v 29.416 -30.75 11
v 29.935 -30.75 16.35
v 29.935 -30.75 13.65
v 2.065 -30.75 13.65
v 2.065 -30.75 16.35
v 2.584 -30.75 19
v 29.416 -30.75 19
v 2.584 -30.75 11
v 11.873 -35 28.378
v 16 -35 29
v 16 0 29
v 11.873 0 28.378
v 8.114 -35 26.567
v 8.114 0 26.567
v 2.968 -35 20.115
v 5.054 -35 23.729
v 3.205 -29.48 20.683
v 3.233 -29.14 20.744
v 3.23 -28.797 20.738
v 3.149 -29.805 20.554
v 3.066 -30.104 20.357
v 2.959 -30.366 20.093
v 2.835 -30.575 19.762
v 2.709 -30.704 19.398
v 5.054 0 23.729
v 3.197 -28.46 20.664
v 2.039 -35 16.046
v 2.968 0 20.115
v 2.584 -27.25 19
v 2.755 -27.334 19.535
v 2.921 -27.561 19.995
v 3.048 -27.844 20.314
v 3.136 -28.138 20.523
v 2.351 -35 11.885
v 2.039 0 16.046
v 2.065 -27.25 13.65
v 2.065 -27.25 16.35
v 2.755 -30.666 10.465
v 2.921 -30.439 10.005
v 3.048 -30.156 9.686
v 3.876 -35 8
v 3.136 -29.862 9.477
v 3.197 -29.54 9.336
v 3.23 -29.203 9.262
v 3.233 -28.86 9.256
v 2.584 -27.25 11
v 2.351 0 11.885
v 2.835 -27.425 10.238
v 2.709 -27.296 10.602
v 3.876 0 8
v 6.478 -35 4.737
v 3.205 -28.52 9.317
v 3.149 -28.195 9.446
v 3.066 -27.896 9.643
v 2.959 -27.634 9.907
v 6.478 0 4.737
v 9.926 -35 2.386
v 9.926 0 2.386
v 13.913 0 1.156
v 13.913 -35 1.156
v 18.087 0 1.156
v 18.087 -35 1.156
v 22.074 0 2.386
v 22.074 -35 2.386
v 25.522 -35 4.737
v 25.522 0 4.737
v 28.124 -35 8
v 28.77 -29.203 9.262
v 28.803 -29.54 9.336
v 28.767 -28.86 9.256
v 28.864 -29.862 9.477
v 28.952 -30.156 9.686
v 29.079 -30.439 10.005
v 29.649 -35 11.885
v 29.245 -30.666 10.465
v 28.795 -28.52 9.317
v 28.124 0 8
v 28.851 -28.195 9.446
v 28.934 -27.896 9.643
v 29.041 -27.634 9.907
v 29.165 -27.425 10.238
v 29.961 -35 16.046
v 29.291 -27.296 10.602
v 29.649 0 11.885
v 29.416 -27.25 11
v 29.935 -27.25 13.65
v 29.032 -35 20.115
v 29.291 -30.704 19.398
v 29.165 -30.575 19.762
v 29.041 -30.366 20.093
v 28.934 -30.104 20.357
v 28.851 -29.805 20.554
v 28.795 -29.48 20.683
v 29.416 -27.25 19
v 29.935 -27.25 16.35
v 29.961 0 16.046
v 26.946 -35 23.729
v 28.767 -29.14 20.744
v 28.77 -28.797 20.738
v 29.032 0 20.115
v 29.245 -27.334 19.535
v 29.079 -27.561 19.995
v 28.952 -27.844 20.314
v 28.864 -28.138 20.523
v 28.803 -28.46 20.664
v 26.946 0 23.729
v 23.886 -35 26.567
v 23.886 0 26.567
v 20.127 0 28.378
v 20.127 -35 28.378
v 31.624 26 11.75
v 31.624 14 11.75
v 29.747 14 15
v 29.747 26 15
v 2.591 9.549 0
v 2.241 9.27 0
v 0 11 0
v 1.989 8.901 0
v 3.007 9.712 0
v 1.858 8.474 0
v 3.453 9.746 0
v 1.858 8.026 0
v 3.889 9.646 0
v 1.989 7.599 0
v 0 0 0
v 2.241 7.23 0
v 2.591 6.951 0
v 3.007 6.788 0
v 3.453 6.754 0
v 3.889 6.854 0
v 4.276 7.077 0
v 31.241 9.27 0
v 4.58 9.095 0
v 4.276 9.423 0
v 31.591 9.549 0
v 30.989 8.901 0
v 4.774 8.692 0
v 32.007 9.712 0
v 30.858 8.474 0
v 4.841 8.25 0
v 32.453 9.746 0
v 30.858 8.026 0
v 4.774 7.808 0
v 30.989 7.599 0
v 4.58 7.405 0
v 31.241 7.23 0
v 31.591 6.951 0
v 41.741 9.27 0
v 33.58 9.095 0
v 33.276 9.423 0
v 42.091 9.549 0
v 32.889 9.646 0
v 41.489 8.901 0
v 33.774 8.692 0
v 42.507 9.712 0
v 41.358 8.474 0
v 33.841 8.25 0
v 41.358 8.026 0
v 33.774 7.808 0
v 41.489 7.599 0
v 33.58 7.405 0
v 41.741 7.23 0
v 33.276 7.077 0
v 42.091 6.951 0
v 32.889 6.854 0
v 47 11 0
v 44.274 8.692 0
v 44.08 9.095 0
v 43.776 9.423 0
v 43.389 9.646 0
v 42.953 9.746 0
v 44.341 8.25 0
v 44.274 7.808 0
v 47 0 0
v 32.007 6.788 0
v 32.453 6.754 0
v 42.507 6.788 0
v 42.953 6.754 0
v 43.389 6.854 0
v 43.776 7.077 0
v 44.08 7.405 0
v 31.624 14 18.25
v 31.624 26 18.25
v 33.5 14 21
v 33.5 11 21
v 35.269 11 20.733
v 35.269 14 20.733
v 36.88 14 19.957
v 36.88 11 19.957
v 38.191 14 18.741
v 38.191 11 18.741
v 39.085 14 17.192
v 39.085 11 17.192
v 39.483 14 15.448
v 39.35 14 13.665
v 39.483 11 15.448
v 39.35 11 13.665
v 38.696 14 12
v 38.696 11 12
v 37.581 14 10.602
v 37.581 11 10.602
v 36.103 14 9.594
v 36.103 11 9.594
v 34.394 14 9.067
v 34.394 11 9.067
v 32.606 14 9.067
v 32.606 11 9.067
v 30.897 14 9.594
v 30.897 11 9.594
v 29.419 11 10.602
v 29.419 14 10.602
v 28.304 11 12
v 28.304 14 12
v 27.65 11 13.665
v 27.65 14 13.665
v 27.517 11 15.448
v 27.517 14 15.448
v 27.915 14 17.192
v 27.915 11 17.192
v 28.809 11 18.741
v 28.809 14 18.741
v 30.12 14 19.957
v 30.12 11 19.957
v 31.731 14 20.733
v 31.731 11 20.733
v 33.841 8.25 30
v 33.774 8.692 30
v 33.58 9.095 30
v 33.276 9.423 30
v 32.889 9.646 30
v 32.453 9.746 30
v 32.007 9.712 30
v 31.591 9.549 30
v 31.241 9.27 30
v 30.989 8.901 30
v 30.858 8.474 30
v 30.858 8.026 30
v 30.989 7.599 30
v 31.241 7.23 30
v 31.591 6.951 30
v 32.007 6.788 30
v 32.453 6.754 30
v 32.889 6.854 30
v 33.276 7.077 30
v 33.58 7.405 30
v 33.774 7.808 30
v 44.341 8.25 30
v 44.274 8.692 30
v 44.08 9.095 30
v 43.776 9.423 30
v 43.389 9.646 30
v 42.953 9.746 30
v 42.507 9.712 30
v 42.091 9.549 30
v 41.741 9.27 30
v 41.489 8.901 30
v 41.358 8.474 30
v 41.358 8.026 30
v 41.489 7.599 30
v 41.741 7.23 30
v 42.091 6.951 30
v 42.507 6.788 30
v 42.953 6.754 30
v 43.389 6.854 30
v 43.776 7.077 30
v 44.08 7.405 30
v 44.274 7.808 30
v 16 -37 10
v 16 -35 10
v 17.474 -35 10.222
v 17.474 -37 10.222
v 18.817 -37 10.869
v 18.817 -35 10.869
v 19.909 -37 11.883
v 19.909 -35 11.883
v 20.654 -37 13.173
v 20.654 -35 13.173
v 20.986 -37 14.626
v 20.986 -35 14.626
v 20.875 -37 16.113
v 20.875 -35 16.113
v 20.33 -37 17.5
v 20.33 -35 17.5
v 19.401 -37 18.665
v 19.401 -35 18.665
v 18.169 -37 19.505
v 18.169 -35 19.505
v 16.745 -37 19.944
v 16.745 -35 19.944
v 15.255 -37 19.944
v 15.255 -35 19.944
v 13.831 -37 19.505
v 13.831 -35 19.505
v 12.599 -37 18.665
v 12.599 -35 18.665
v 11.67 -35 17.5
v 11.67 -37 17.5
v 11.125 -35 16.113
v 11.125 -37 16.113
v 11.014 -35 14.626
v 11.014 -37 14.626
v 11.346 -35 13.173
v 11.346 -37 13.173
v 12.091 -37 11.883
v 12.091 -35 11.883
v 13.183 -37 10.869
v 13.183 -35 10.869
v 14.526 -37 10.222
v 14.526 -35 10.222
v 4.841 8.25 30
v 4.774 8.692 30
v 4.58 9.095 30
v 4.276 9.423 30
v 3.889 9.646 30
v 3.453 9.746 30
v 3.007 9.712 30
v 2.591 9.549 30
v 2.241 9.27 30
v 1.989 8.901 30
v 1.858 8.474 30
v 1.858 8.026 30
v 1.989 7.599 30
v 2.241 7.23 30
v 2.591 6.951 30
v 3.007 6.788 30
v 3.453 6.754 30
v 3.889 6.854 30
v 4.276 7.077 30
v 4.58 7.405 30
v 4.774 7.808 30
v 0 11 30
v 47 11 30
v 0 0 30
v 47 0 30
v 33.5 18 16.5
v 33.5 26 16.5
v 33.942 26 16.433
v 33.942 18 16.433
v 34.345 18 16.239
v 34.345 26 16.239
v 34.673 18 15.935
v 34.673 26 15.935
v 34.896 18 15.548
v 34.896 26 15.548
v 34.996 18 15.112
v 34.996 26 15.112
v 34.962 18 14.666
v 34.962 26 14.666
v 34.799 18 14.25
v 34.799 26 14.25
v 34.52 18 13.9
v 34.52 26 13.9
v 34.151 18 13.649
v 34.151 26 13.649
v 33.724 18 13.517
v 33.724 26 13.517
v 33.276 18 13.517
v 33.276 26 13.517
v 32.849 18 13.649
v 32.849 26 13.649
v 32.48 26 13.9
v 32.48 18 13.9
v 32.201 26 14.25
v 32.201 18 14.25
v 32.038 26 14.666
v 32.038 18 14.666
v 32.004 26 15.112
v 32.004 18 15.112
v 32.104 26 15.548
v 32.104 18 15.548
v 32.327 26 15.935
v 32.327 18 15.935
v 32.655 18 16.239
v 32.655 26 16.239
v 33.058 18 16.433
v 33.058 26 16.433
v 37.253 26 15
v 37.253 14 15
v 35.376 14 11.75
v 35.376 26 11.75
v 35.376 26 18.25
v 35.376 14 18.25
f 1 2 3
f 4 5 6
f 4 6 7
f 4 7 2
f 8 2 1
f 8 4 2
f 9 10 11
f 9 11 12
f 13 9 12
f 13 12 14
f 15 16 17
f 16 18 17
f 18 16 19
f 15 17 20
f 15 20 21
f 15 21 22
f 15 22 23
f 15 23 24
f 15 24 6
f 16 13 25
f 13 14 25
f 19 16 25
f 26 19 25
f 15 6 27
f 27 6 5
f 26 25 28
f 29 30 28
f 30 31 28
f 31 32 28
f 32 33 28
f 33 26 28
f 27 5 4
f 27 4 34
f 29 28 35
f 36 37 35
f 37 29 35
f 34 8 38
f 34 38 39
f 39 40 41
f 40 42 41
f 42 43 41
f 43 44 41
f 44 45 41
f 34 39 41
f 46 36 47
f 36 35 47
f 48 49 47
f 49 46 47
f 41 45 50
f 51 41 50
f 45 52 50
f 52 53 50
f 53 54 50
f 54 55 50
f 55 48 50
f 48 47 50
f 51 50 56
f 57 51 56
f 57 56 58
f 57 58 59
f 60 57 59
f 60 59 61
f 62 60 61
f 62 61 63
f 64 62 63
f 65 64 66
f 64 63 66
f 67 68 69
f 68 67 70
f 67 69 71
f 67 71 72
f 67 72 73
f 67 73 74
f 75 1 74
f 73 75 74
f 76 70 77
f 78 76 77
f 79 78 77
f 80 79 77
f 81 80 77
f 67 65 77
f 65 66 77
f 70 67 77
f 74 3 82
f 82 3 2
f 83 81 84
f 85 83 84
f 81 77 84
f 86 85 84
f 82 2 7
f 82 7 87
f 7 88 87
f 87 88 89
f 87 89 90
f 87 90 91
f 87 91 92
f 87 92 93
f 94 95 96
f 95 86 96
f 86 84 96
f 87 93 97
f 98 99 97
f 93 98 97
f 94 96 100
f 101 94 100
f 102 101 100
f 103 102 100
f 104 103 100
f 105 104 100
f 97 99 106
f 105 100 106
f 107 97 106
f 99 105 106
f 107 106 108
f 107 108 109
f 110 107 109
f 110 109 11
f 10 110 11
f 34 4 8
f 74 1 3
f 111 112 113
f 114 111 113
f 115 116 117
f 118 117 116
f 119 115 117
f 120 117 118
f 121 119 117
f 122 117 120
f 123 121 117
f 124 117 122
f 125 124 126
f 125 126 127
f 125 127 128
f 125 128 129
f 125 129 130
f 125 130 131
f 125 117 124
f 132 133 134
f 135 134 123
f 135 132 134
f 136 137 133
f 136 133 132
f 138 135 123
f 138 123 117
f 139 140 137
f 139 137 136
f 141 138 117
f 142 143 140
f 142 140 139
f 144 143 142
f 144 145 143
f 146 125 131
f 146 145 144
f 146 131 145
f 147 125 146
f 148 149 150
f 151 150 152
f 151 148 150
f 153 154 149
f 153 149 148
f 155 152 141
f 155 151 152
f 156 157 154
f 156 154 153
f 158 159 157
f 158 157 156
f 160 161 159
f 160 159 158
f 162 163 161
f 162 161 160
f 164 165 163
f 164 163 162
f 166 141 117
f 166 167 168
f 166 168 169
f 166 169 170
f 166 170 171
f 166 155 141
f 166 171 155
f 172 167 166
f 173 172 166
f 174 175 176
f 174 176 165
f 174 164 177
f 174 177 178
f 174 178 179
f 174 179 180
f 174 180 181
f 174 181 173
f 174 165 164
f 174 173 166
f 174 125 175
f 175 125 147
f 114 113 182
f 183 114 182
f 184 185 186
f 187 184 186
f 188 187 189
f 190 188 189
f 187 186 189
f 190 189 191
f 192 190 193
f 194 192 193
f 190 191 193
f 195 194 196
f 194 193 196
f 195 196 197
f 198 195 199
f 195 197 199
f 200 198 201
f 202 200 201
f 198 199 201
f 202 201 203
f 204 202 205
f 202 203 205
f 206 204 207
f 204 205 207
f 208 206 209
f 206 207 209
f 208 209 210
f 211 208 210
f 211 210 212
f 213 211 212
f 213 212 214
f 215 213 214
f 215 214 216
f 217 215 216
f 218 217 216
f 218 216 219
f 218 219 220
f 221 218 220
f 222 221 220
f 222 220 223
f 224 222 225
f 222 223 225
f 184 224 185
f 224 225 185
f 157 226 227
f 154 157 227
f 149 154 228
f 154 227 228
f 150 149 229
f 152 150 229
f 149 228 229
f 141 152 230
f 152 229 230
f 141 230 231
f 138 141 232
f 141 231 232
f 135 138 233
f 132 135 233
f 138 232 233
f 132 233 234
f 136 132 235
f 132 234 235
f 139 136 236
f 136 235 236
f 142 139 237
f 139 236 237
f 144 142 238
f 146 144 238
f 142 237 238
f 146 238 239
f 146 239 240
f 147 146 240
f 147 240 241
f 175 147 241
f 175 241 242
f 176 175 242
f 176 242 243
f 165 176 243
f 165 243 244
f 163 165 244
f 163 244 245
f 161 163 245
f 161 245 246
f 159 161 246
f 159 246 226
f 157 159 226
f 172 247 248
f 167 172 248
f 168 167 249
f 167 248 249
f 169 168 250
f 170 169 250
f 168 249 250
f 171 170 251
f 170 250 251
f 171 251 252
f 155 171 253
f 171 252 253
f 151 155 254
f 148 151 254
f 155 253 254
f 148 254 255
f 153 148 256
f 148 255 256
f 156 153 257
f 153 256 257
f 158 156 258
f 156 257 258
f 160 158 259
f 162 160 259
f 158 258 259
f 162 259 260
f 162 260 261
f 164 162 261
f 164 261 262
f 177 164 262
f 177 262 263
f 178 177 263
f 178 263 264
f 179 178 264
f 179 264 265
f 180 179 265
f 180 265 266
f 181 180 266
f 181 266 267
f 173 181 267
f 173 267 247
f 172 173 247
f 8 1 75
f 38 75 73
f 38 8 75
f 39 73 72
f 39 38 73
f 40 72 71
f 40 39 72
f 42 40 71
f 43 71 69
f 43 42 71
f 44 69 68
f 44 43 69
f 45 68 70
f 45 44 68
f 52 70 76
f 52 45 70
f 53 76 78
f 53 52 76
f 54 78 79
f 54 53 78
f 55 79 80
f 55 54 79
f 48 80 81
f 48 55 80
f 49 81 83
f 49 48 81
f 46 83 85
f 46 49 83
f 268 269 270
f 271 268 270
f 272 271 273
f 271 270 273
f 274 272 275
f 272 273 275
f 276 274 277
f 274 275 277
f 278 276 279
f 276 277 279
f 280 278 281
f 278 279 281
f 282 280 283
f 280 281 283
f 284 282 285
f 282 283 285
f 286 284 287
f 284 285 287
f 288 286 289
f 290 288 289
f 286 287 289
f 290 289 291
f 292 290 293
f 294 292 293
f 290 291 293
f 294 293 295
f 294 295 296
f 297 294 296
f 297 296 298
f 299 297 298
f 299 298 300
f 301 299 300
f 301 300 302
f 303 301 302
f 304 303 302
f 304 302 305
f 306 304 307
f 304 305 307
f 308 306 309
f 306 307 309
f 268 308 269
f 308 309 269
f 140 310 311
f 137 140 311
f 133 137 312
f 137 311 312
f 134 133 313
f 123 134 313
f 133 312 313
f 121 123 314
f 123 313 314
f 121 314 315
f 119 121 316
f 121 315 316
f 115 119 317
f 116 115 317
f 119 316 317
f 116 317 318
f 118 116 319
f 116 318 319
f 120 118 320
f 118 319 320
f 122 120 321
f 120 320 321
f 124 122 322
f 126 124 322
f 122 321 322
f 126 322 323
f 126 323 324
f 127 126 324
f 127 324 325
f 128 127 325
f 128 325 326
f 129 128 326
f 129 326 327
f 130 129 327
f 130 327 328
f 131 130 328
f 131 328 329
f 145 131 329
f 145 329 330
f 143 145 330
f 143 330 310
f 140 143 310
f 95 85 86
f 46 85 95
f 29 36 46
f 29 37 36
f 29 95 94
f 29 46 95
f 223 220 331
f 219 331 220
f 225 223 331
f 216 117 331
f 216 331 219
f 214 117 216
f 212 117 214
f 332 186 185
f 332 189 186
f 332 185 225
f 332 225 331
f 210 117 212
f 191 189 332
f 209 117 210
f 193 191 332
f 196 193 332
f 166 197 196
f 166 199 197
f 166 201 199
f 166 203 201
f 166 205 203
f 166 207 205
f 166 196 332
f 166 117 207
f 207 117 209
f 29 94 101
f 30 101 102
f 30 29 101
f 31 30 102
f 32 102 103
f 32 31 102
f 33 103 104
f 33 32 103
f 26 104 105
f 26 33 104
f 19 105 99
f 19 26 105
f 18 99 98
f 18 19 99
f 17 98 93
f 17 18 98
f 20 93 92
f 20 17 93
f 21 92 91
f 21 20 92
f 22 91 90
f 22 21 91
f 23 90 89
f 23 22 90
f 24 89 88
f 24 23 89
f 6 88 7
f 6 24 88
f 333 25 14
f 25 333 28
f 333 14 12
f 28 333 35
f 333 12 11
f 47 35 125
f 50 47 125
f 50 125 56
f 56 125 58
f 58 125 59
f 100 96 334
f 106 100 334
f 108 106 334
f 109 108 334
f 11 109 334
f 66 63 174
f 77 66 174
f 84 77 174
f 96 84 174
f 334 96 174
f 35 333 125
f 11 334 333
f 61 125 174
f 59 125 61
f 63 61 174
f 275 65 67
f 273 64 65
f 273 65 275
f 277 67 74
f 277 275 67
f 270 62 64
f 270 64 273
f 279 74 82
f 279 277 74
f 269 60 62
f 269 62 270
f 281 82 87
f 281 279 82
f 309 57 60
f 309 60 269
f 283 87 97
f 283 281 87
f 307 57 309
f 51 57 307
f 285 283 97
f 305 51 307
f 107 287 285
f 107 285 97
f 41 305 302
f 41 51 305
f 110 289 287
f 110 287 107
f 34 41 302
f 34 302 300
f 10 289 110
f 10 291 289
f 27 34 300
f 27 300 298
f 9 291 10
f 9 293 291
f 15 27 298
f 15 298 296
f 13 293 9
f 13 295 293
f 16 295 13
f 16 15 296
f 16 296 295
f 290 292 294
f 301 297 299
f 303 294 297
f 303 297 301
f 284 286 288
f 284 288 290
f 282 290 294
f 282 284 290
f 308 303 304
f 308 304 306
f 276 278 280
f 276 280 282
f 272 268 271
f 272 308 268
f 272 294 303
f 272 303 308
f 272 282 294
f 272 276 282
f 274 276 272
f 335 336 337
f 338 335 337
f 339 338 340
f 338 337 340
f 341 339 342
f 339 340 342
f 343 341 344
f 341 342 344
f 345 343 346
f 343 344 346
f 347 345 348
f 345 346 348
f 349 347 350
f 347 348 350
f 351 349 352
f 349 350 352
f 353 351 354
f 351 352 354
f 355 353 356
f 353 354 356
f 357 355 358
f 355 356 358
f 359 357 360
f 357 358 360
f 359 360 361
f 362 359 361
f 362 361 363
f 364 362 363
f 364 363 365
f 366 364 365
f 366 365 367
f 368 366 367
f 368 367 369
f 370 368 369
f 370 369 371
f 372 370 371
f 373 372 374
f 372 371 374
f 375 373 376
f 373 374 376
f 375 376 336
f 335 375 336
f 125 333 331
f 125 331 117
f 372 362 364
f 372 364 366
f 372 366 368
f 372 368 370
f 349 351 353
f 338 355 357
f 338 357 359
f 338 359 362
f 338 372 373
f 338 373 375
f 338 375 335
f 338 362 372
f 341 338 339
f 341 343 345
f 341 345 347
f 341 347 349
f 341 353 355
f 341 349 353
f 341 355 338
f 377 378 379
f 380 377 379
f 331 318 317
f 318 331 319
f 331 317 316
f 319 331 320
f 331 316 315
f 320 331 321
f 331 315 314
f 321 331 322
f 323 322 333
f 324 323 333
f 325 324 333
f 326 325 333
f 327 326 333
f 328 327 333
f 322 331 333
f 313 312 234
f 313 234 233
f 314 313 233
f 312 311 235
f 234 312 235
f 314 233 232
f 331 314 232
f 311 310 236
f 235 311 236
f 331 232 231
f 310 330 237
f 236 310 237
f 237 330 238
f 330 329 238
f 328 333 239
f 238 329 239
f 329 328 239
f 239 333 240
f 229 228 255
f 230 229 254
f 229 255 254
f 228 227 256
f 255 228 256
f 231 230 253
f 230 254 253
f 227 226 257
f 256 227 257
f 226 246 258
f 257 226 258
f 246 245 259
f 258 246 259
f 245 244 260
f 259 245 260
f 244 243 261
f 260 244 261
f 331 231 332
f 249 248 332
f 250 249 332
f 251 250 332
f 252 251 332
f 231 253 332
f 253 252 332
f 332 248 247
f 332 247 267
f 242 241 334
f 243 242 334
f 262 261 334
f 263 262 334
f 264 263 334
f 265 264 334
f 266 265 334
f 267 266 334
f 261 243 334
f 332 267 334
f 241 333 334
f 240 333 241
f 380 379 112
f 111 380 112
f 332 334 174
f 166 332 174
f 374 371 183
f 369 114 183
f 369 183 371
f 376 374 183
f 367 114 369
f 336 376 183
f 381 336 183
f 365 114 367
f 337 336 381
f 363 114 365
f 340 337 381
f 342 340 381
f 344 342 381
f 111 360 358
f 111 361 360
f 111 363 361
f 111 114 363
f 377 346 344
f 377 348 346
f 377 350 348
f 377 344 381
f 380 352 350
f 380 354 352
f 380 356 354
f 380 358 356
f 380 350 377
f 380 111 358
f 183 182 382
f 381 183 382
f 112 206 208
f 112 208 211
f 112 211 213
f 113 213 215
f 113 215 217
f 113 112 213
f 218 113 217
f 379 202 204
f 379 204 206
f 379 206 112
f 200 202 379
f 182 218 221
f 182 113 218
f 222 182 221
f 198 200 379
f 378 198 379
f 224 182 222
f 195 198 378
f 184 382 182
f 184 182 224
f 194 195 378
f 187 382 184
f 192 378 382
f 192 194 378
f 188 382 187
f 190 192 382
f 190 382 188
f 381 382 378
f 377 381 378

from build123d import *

# Parameters (mm, degrees)
SKETCH_1_W          = 47
SKETCH_1_H          = 30
EXTRUDE_1_DEPTH     = 11
SKETCH_2_R          = 6
EXTRUDE_2_DEPTH     = 3
EXTRUDE_3_DEPTH     = 12
SKETCH_4_R          = 14
EXTRUDE_4_DEPTH     = 35
SKETCH_5_R          = 5
EXTRUDE_5_DEPTH     = 2
SKETCH_6_R          = 1.5
CUT_EXTRUDE_1_DEPTH = 67.917860097
CUT_EXTRUDE_2_DEPTH = 67.917860097
SKETCH_9_R          = 1.5
CUT_EXTRUDE_3_DEPTH = 8


with BuildPart() as part:
    # 草图1 → 凸台-拉伸1 (new body)
    with BuildSketch(Plane(origin=(0, 0, 0), x_dir=(1, 0, 0), z_dir=(0, 1, 0))):
        with Locations((23.5, -15)):
            Rectangle(SKETCH_1_W, SKETCH_1_H)
    extrude(amount=EXTRUDE_1_DEPTH)

    # 草图2 → 凸台-拉伸2 (add)
    with BuildSketch(Plane(origin=(0, 11, 0), x_dir=(1, 0, 0), z_dir=(0, 1, 0))):
        with Locations(Location((33.5, -15, 0), (0, 0, 270))):
            Circle(SKETCH_2_R)
    extrude(amount=EXTRUDE_2_DEPTH)

    # 草图3 → 凸台-拉伸3 (add)
    with BuildSketch(Plane(origin=(0, 14, 0), x_dir=(1, 0, 0), z_dir=(0, 1, 0))):
        Polygon((37.25277675, -15), (35.376388375, -11.75), (31.623611625, -11.75), (29.74722325, -15), (31.623611625, -18.25), (35.376388375, -18.25), align=None)
    extrude(amount=EXTRUDE_3_DEPTH)

    # 草图4 → 凸台-拉伸4 (add)
    with BuildSketch(Plane.XZ):
        with Locations(Location((16, 15, 0), (0, 0, 90))):
            Circle(SKETCH_4_R)
    extrude(amount=EXTRUDE_4_DEPTH)

    # 草图5 → 凸台-拉伸5 (add)
    with BuildSketch(Plane.XZ.offset(35)):
        with Locations(Location((16, 15, 0), (0, 0, 270))):
            Circle(SKETCH_5_R)
    extrude(amount=EXTRUDE_5_DEPTH)

    # 草图6 → 切除-拉伸1 (cut, through all)
    with BuildSketch(Plane.XY.offset(30)):
        with Locations((3.340757383, 8.25)):
            Circle(SKETCH_6_R)
        with Locations((32.340757383, 8.25)):
            Circle(SKETCH_6_R)
        with Locations((42.840757383, 8.25)):
            Circle(SKETCH_6_R)
    extrude(amount=-CUT_EXTRUDE_1_DEPTH, mode=Mode.SUBTRACT)

    # 草图7 → 切除-拉伸2 (cut, through all)
    with BuildSketch(Plane.ZY):
        with BuildLine():
            Line((11, -27.25), (19, -27.25))
            ThreePointArc((19, -27.25), (20.75, -29), (19, -30.75))
            Line((19, -30.75), (11, -30.75))
            ThreePointArc((11, -30.75), (9.25, -29), (11, -27.25))
        make_face()
    extrude(amount=-CUT_EXTRUDE_2_DEPTH, mode=Mode.SUBTRACT)

    # 草图9 → 切除-拉伸3 (cut)
    with BuildSketch(Plane(origin=(0, 26, 0), x_dir=(1, 0, 0), z_dir=(0, 1, 0))):
        with Locations(Location((33.5, -15, 0), (0, 0, 270))):
            Circle(SKETCH_9_R)
    extrude(amount=-CUT_EXTRUDE_3_DEPTH, mode=Mode.SUBTRACT)


solid = part.part
